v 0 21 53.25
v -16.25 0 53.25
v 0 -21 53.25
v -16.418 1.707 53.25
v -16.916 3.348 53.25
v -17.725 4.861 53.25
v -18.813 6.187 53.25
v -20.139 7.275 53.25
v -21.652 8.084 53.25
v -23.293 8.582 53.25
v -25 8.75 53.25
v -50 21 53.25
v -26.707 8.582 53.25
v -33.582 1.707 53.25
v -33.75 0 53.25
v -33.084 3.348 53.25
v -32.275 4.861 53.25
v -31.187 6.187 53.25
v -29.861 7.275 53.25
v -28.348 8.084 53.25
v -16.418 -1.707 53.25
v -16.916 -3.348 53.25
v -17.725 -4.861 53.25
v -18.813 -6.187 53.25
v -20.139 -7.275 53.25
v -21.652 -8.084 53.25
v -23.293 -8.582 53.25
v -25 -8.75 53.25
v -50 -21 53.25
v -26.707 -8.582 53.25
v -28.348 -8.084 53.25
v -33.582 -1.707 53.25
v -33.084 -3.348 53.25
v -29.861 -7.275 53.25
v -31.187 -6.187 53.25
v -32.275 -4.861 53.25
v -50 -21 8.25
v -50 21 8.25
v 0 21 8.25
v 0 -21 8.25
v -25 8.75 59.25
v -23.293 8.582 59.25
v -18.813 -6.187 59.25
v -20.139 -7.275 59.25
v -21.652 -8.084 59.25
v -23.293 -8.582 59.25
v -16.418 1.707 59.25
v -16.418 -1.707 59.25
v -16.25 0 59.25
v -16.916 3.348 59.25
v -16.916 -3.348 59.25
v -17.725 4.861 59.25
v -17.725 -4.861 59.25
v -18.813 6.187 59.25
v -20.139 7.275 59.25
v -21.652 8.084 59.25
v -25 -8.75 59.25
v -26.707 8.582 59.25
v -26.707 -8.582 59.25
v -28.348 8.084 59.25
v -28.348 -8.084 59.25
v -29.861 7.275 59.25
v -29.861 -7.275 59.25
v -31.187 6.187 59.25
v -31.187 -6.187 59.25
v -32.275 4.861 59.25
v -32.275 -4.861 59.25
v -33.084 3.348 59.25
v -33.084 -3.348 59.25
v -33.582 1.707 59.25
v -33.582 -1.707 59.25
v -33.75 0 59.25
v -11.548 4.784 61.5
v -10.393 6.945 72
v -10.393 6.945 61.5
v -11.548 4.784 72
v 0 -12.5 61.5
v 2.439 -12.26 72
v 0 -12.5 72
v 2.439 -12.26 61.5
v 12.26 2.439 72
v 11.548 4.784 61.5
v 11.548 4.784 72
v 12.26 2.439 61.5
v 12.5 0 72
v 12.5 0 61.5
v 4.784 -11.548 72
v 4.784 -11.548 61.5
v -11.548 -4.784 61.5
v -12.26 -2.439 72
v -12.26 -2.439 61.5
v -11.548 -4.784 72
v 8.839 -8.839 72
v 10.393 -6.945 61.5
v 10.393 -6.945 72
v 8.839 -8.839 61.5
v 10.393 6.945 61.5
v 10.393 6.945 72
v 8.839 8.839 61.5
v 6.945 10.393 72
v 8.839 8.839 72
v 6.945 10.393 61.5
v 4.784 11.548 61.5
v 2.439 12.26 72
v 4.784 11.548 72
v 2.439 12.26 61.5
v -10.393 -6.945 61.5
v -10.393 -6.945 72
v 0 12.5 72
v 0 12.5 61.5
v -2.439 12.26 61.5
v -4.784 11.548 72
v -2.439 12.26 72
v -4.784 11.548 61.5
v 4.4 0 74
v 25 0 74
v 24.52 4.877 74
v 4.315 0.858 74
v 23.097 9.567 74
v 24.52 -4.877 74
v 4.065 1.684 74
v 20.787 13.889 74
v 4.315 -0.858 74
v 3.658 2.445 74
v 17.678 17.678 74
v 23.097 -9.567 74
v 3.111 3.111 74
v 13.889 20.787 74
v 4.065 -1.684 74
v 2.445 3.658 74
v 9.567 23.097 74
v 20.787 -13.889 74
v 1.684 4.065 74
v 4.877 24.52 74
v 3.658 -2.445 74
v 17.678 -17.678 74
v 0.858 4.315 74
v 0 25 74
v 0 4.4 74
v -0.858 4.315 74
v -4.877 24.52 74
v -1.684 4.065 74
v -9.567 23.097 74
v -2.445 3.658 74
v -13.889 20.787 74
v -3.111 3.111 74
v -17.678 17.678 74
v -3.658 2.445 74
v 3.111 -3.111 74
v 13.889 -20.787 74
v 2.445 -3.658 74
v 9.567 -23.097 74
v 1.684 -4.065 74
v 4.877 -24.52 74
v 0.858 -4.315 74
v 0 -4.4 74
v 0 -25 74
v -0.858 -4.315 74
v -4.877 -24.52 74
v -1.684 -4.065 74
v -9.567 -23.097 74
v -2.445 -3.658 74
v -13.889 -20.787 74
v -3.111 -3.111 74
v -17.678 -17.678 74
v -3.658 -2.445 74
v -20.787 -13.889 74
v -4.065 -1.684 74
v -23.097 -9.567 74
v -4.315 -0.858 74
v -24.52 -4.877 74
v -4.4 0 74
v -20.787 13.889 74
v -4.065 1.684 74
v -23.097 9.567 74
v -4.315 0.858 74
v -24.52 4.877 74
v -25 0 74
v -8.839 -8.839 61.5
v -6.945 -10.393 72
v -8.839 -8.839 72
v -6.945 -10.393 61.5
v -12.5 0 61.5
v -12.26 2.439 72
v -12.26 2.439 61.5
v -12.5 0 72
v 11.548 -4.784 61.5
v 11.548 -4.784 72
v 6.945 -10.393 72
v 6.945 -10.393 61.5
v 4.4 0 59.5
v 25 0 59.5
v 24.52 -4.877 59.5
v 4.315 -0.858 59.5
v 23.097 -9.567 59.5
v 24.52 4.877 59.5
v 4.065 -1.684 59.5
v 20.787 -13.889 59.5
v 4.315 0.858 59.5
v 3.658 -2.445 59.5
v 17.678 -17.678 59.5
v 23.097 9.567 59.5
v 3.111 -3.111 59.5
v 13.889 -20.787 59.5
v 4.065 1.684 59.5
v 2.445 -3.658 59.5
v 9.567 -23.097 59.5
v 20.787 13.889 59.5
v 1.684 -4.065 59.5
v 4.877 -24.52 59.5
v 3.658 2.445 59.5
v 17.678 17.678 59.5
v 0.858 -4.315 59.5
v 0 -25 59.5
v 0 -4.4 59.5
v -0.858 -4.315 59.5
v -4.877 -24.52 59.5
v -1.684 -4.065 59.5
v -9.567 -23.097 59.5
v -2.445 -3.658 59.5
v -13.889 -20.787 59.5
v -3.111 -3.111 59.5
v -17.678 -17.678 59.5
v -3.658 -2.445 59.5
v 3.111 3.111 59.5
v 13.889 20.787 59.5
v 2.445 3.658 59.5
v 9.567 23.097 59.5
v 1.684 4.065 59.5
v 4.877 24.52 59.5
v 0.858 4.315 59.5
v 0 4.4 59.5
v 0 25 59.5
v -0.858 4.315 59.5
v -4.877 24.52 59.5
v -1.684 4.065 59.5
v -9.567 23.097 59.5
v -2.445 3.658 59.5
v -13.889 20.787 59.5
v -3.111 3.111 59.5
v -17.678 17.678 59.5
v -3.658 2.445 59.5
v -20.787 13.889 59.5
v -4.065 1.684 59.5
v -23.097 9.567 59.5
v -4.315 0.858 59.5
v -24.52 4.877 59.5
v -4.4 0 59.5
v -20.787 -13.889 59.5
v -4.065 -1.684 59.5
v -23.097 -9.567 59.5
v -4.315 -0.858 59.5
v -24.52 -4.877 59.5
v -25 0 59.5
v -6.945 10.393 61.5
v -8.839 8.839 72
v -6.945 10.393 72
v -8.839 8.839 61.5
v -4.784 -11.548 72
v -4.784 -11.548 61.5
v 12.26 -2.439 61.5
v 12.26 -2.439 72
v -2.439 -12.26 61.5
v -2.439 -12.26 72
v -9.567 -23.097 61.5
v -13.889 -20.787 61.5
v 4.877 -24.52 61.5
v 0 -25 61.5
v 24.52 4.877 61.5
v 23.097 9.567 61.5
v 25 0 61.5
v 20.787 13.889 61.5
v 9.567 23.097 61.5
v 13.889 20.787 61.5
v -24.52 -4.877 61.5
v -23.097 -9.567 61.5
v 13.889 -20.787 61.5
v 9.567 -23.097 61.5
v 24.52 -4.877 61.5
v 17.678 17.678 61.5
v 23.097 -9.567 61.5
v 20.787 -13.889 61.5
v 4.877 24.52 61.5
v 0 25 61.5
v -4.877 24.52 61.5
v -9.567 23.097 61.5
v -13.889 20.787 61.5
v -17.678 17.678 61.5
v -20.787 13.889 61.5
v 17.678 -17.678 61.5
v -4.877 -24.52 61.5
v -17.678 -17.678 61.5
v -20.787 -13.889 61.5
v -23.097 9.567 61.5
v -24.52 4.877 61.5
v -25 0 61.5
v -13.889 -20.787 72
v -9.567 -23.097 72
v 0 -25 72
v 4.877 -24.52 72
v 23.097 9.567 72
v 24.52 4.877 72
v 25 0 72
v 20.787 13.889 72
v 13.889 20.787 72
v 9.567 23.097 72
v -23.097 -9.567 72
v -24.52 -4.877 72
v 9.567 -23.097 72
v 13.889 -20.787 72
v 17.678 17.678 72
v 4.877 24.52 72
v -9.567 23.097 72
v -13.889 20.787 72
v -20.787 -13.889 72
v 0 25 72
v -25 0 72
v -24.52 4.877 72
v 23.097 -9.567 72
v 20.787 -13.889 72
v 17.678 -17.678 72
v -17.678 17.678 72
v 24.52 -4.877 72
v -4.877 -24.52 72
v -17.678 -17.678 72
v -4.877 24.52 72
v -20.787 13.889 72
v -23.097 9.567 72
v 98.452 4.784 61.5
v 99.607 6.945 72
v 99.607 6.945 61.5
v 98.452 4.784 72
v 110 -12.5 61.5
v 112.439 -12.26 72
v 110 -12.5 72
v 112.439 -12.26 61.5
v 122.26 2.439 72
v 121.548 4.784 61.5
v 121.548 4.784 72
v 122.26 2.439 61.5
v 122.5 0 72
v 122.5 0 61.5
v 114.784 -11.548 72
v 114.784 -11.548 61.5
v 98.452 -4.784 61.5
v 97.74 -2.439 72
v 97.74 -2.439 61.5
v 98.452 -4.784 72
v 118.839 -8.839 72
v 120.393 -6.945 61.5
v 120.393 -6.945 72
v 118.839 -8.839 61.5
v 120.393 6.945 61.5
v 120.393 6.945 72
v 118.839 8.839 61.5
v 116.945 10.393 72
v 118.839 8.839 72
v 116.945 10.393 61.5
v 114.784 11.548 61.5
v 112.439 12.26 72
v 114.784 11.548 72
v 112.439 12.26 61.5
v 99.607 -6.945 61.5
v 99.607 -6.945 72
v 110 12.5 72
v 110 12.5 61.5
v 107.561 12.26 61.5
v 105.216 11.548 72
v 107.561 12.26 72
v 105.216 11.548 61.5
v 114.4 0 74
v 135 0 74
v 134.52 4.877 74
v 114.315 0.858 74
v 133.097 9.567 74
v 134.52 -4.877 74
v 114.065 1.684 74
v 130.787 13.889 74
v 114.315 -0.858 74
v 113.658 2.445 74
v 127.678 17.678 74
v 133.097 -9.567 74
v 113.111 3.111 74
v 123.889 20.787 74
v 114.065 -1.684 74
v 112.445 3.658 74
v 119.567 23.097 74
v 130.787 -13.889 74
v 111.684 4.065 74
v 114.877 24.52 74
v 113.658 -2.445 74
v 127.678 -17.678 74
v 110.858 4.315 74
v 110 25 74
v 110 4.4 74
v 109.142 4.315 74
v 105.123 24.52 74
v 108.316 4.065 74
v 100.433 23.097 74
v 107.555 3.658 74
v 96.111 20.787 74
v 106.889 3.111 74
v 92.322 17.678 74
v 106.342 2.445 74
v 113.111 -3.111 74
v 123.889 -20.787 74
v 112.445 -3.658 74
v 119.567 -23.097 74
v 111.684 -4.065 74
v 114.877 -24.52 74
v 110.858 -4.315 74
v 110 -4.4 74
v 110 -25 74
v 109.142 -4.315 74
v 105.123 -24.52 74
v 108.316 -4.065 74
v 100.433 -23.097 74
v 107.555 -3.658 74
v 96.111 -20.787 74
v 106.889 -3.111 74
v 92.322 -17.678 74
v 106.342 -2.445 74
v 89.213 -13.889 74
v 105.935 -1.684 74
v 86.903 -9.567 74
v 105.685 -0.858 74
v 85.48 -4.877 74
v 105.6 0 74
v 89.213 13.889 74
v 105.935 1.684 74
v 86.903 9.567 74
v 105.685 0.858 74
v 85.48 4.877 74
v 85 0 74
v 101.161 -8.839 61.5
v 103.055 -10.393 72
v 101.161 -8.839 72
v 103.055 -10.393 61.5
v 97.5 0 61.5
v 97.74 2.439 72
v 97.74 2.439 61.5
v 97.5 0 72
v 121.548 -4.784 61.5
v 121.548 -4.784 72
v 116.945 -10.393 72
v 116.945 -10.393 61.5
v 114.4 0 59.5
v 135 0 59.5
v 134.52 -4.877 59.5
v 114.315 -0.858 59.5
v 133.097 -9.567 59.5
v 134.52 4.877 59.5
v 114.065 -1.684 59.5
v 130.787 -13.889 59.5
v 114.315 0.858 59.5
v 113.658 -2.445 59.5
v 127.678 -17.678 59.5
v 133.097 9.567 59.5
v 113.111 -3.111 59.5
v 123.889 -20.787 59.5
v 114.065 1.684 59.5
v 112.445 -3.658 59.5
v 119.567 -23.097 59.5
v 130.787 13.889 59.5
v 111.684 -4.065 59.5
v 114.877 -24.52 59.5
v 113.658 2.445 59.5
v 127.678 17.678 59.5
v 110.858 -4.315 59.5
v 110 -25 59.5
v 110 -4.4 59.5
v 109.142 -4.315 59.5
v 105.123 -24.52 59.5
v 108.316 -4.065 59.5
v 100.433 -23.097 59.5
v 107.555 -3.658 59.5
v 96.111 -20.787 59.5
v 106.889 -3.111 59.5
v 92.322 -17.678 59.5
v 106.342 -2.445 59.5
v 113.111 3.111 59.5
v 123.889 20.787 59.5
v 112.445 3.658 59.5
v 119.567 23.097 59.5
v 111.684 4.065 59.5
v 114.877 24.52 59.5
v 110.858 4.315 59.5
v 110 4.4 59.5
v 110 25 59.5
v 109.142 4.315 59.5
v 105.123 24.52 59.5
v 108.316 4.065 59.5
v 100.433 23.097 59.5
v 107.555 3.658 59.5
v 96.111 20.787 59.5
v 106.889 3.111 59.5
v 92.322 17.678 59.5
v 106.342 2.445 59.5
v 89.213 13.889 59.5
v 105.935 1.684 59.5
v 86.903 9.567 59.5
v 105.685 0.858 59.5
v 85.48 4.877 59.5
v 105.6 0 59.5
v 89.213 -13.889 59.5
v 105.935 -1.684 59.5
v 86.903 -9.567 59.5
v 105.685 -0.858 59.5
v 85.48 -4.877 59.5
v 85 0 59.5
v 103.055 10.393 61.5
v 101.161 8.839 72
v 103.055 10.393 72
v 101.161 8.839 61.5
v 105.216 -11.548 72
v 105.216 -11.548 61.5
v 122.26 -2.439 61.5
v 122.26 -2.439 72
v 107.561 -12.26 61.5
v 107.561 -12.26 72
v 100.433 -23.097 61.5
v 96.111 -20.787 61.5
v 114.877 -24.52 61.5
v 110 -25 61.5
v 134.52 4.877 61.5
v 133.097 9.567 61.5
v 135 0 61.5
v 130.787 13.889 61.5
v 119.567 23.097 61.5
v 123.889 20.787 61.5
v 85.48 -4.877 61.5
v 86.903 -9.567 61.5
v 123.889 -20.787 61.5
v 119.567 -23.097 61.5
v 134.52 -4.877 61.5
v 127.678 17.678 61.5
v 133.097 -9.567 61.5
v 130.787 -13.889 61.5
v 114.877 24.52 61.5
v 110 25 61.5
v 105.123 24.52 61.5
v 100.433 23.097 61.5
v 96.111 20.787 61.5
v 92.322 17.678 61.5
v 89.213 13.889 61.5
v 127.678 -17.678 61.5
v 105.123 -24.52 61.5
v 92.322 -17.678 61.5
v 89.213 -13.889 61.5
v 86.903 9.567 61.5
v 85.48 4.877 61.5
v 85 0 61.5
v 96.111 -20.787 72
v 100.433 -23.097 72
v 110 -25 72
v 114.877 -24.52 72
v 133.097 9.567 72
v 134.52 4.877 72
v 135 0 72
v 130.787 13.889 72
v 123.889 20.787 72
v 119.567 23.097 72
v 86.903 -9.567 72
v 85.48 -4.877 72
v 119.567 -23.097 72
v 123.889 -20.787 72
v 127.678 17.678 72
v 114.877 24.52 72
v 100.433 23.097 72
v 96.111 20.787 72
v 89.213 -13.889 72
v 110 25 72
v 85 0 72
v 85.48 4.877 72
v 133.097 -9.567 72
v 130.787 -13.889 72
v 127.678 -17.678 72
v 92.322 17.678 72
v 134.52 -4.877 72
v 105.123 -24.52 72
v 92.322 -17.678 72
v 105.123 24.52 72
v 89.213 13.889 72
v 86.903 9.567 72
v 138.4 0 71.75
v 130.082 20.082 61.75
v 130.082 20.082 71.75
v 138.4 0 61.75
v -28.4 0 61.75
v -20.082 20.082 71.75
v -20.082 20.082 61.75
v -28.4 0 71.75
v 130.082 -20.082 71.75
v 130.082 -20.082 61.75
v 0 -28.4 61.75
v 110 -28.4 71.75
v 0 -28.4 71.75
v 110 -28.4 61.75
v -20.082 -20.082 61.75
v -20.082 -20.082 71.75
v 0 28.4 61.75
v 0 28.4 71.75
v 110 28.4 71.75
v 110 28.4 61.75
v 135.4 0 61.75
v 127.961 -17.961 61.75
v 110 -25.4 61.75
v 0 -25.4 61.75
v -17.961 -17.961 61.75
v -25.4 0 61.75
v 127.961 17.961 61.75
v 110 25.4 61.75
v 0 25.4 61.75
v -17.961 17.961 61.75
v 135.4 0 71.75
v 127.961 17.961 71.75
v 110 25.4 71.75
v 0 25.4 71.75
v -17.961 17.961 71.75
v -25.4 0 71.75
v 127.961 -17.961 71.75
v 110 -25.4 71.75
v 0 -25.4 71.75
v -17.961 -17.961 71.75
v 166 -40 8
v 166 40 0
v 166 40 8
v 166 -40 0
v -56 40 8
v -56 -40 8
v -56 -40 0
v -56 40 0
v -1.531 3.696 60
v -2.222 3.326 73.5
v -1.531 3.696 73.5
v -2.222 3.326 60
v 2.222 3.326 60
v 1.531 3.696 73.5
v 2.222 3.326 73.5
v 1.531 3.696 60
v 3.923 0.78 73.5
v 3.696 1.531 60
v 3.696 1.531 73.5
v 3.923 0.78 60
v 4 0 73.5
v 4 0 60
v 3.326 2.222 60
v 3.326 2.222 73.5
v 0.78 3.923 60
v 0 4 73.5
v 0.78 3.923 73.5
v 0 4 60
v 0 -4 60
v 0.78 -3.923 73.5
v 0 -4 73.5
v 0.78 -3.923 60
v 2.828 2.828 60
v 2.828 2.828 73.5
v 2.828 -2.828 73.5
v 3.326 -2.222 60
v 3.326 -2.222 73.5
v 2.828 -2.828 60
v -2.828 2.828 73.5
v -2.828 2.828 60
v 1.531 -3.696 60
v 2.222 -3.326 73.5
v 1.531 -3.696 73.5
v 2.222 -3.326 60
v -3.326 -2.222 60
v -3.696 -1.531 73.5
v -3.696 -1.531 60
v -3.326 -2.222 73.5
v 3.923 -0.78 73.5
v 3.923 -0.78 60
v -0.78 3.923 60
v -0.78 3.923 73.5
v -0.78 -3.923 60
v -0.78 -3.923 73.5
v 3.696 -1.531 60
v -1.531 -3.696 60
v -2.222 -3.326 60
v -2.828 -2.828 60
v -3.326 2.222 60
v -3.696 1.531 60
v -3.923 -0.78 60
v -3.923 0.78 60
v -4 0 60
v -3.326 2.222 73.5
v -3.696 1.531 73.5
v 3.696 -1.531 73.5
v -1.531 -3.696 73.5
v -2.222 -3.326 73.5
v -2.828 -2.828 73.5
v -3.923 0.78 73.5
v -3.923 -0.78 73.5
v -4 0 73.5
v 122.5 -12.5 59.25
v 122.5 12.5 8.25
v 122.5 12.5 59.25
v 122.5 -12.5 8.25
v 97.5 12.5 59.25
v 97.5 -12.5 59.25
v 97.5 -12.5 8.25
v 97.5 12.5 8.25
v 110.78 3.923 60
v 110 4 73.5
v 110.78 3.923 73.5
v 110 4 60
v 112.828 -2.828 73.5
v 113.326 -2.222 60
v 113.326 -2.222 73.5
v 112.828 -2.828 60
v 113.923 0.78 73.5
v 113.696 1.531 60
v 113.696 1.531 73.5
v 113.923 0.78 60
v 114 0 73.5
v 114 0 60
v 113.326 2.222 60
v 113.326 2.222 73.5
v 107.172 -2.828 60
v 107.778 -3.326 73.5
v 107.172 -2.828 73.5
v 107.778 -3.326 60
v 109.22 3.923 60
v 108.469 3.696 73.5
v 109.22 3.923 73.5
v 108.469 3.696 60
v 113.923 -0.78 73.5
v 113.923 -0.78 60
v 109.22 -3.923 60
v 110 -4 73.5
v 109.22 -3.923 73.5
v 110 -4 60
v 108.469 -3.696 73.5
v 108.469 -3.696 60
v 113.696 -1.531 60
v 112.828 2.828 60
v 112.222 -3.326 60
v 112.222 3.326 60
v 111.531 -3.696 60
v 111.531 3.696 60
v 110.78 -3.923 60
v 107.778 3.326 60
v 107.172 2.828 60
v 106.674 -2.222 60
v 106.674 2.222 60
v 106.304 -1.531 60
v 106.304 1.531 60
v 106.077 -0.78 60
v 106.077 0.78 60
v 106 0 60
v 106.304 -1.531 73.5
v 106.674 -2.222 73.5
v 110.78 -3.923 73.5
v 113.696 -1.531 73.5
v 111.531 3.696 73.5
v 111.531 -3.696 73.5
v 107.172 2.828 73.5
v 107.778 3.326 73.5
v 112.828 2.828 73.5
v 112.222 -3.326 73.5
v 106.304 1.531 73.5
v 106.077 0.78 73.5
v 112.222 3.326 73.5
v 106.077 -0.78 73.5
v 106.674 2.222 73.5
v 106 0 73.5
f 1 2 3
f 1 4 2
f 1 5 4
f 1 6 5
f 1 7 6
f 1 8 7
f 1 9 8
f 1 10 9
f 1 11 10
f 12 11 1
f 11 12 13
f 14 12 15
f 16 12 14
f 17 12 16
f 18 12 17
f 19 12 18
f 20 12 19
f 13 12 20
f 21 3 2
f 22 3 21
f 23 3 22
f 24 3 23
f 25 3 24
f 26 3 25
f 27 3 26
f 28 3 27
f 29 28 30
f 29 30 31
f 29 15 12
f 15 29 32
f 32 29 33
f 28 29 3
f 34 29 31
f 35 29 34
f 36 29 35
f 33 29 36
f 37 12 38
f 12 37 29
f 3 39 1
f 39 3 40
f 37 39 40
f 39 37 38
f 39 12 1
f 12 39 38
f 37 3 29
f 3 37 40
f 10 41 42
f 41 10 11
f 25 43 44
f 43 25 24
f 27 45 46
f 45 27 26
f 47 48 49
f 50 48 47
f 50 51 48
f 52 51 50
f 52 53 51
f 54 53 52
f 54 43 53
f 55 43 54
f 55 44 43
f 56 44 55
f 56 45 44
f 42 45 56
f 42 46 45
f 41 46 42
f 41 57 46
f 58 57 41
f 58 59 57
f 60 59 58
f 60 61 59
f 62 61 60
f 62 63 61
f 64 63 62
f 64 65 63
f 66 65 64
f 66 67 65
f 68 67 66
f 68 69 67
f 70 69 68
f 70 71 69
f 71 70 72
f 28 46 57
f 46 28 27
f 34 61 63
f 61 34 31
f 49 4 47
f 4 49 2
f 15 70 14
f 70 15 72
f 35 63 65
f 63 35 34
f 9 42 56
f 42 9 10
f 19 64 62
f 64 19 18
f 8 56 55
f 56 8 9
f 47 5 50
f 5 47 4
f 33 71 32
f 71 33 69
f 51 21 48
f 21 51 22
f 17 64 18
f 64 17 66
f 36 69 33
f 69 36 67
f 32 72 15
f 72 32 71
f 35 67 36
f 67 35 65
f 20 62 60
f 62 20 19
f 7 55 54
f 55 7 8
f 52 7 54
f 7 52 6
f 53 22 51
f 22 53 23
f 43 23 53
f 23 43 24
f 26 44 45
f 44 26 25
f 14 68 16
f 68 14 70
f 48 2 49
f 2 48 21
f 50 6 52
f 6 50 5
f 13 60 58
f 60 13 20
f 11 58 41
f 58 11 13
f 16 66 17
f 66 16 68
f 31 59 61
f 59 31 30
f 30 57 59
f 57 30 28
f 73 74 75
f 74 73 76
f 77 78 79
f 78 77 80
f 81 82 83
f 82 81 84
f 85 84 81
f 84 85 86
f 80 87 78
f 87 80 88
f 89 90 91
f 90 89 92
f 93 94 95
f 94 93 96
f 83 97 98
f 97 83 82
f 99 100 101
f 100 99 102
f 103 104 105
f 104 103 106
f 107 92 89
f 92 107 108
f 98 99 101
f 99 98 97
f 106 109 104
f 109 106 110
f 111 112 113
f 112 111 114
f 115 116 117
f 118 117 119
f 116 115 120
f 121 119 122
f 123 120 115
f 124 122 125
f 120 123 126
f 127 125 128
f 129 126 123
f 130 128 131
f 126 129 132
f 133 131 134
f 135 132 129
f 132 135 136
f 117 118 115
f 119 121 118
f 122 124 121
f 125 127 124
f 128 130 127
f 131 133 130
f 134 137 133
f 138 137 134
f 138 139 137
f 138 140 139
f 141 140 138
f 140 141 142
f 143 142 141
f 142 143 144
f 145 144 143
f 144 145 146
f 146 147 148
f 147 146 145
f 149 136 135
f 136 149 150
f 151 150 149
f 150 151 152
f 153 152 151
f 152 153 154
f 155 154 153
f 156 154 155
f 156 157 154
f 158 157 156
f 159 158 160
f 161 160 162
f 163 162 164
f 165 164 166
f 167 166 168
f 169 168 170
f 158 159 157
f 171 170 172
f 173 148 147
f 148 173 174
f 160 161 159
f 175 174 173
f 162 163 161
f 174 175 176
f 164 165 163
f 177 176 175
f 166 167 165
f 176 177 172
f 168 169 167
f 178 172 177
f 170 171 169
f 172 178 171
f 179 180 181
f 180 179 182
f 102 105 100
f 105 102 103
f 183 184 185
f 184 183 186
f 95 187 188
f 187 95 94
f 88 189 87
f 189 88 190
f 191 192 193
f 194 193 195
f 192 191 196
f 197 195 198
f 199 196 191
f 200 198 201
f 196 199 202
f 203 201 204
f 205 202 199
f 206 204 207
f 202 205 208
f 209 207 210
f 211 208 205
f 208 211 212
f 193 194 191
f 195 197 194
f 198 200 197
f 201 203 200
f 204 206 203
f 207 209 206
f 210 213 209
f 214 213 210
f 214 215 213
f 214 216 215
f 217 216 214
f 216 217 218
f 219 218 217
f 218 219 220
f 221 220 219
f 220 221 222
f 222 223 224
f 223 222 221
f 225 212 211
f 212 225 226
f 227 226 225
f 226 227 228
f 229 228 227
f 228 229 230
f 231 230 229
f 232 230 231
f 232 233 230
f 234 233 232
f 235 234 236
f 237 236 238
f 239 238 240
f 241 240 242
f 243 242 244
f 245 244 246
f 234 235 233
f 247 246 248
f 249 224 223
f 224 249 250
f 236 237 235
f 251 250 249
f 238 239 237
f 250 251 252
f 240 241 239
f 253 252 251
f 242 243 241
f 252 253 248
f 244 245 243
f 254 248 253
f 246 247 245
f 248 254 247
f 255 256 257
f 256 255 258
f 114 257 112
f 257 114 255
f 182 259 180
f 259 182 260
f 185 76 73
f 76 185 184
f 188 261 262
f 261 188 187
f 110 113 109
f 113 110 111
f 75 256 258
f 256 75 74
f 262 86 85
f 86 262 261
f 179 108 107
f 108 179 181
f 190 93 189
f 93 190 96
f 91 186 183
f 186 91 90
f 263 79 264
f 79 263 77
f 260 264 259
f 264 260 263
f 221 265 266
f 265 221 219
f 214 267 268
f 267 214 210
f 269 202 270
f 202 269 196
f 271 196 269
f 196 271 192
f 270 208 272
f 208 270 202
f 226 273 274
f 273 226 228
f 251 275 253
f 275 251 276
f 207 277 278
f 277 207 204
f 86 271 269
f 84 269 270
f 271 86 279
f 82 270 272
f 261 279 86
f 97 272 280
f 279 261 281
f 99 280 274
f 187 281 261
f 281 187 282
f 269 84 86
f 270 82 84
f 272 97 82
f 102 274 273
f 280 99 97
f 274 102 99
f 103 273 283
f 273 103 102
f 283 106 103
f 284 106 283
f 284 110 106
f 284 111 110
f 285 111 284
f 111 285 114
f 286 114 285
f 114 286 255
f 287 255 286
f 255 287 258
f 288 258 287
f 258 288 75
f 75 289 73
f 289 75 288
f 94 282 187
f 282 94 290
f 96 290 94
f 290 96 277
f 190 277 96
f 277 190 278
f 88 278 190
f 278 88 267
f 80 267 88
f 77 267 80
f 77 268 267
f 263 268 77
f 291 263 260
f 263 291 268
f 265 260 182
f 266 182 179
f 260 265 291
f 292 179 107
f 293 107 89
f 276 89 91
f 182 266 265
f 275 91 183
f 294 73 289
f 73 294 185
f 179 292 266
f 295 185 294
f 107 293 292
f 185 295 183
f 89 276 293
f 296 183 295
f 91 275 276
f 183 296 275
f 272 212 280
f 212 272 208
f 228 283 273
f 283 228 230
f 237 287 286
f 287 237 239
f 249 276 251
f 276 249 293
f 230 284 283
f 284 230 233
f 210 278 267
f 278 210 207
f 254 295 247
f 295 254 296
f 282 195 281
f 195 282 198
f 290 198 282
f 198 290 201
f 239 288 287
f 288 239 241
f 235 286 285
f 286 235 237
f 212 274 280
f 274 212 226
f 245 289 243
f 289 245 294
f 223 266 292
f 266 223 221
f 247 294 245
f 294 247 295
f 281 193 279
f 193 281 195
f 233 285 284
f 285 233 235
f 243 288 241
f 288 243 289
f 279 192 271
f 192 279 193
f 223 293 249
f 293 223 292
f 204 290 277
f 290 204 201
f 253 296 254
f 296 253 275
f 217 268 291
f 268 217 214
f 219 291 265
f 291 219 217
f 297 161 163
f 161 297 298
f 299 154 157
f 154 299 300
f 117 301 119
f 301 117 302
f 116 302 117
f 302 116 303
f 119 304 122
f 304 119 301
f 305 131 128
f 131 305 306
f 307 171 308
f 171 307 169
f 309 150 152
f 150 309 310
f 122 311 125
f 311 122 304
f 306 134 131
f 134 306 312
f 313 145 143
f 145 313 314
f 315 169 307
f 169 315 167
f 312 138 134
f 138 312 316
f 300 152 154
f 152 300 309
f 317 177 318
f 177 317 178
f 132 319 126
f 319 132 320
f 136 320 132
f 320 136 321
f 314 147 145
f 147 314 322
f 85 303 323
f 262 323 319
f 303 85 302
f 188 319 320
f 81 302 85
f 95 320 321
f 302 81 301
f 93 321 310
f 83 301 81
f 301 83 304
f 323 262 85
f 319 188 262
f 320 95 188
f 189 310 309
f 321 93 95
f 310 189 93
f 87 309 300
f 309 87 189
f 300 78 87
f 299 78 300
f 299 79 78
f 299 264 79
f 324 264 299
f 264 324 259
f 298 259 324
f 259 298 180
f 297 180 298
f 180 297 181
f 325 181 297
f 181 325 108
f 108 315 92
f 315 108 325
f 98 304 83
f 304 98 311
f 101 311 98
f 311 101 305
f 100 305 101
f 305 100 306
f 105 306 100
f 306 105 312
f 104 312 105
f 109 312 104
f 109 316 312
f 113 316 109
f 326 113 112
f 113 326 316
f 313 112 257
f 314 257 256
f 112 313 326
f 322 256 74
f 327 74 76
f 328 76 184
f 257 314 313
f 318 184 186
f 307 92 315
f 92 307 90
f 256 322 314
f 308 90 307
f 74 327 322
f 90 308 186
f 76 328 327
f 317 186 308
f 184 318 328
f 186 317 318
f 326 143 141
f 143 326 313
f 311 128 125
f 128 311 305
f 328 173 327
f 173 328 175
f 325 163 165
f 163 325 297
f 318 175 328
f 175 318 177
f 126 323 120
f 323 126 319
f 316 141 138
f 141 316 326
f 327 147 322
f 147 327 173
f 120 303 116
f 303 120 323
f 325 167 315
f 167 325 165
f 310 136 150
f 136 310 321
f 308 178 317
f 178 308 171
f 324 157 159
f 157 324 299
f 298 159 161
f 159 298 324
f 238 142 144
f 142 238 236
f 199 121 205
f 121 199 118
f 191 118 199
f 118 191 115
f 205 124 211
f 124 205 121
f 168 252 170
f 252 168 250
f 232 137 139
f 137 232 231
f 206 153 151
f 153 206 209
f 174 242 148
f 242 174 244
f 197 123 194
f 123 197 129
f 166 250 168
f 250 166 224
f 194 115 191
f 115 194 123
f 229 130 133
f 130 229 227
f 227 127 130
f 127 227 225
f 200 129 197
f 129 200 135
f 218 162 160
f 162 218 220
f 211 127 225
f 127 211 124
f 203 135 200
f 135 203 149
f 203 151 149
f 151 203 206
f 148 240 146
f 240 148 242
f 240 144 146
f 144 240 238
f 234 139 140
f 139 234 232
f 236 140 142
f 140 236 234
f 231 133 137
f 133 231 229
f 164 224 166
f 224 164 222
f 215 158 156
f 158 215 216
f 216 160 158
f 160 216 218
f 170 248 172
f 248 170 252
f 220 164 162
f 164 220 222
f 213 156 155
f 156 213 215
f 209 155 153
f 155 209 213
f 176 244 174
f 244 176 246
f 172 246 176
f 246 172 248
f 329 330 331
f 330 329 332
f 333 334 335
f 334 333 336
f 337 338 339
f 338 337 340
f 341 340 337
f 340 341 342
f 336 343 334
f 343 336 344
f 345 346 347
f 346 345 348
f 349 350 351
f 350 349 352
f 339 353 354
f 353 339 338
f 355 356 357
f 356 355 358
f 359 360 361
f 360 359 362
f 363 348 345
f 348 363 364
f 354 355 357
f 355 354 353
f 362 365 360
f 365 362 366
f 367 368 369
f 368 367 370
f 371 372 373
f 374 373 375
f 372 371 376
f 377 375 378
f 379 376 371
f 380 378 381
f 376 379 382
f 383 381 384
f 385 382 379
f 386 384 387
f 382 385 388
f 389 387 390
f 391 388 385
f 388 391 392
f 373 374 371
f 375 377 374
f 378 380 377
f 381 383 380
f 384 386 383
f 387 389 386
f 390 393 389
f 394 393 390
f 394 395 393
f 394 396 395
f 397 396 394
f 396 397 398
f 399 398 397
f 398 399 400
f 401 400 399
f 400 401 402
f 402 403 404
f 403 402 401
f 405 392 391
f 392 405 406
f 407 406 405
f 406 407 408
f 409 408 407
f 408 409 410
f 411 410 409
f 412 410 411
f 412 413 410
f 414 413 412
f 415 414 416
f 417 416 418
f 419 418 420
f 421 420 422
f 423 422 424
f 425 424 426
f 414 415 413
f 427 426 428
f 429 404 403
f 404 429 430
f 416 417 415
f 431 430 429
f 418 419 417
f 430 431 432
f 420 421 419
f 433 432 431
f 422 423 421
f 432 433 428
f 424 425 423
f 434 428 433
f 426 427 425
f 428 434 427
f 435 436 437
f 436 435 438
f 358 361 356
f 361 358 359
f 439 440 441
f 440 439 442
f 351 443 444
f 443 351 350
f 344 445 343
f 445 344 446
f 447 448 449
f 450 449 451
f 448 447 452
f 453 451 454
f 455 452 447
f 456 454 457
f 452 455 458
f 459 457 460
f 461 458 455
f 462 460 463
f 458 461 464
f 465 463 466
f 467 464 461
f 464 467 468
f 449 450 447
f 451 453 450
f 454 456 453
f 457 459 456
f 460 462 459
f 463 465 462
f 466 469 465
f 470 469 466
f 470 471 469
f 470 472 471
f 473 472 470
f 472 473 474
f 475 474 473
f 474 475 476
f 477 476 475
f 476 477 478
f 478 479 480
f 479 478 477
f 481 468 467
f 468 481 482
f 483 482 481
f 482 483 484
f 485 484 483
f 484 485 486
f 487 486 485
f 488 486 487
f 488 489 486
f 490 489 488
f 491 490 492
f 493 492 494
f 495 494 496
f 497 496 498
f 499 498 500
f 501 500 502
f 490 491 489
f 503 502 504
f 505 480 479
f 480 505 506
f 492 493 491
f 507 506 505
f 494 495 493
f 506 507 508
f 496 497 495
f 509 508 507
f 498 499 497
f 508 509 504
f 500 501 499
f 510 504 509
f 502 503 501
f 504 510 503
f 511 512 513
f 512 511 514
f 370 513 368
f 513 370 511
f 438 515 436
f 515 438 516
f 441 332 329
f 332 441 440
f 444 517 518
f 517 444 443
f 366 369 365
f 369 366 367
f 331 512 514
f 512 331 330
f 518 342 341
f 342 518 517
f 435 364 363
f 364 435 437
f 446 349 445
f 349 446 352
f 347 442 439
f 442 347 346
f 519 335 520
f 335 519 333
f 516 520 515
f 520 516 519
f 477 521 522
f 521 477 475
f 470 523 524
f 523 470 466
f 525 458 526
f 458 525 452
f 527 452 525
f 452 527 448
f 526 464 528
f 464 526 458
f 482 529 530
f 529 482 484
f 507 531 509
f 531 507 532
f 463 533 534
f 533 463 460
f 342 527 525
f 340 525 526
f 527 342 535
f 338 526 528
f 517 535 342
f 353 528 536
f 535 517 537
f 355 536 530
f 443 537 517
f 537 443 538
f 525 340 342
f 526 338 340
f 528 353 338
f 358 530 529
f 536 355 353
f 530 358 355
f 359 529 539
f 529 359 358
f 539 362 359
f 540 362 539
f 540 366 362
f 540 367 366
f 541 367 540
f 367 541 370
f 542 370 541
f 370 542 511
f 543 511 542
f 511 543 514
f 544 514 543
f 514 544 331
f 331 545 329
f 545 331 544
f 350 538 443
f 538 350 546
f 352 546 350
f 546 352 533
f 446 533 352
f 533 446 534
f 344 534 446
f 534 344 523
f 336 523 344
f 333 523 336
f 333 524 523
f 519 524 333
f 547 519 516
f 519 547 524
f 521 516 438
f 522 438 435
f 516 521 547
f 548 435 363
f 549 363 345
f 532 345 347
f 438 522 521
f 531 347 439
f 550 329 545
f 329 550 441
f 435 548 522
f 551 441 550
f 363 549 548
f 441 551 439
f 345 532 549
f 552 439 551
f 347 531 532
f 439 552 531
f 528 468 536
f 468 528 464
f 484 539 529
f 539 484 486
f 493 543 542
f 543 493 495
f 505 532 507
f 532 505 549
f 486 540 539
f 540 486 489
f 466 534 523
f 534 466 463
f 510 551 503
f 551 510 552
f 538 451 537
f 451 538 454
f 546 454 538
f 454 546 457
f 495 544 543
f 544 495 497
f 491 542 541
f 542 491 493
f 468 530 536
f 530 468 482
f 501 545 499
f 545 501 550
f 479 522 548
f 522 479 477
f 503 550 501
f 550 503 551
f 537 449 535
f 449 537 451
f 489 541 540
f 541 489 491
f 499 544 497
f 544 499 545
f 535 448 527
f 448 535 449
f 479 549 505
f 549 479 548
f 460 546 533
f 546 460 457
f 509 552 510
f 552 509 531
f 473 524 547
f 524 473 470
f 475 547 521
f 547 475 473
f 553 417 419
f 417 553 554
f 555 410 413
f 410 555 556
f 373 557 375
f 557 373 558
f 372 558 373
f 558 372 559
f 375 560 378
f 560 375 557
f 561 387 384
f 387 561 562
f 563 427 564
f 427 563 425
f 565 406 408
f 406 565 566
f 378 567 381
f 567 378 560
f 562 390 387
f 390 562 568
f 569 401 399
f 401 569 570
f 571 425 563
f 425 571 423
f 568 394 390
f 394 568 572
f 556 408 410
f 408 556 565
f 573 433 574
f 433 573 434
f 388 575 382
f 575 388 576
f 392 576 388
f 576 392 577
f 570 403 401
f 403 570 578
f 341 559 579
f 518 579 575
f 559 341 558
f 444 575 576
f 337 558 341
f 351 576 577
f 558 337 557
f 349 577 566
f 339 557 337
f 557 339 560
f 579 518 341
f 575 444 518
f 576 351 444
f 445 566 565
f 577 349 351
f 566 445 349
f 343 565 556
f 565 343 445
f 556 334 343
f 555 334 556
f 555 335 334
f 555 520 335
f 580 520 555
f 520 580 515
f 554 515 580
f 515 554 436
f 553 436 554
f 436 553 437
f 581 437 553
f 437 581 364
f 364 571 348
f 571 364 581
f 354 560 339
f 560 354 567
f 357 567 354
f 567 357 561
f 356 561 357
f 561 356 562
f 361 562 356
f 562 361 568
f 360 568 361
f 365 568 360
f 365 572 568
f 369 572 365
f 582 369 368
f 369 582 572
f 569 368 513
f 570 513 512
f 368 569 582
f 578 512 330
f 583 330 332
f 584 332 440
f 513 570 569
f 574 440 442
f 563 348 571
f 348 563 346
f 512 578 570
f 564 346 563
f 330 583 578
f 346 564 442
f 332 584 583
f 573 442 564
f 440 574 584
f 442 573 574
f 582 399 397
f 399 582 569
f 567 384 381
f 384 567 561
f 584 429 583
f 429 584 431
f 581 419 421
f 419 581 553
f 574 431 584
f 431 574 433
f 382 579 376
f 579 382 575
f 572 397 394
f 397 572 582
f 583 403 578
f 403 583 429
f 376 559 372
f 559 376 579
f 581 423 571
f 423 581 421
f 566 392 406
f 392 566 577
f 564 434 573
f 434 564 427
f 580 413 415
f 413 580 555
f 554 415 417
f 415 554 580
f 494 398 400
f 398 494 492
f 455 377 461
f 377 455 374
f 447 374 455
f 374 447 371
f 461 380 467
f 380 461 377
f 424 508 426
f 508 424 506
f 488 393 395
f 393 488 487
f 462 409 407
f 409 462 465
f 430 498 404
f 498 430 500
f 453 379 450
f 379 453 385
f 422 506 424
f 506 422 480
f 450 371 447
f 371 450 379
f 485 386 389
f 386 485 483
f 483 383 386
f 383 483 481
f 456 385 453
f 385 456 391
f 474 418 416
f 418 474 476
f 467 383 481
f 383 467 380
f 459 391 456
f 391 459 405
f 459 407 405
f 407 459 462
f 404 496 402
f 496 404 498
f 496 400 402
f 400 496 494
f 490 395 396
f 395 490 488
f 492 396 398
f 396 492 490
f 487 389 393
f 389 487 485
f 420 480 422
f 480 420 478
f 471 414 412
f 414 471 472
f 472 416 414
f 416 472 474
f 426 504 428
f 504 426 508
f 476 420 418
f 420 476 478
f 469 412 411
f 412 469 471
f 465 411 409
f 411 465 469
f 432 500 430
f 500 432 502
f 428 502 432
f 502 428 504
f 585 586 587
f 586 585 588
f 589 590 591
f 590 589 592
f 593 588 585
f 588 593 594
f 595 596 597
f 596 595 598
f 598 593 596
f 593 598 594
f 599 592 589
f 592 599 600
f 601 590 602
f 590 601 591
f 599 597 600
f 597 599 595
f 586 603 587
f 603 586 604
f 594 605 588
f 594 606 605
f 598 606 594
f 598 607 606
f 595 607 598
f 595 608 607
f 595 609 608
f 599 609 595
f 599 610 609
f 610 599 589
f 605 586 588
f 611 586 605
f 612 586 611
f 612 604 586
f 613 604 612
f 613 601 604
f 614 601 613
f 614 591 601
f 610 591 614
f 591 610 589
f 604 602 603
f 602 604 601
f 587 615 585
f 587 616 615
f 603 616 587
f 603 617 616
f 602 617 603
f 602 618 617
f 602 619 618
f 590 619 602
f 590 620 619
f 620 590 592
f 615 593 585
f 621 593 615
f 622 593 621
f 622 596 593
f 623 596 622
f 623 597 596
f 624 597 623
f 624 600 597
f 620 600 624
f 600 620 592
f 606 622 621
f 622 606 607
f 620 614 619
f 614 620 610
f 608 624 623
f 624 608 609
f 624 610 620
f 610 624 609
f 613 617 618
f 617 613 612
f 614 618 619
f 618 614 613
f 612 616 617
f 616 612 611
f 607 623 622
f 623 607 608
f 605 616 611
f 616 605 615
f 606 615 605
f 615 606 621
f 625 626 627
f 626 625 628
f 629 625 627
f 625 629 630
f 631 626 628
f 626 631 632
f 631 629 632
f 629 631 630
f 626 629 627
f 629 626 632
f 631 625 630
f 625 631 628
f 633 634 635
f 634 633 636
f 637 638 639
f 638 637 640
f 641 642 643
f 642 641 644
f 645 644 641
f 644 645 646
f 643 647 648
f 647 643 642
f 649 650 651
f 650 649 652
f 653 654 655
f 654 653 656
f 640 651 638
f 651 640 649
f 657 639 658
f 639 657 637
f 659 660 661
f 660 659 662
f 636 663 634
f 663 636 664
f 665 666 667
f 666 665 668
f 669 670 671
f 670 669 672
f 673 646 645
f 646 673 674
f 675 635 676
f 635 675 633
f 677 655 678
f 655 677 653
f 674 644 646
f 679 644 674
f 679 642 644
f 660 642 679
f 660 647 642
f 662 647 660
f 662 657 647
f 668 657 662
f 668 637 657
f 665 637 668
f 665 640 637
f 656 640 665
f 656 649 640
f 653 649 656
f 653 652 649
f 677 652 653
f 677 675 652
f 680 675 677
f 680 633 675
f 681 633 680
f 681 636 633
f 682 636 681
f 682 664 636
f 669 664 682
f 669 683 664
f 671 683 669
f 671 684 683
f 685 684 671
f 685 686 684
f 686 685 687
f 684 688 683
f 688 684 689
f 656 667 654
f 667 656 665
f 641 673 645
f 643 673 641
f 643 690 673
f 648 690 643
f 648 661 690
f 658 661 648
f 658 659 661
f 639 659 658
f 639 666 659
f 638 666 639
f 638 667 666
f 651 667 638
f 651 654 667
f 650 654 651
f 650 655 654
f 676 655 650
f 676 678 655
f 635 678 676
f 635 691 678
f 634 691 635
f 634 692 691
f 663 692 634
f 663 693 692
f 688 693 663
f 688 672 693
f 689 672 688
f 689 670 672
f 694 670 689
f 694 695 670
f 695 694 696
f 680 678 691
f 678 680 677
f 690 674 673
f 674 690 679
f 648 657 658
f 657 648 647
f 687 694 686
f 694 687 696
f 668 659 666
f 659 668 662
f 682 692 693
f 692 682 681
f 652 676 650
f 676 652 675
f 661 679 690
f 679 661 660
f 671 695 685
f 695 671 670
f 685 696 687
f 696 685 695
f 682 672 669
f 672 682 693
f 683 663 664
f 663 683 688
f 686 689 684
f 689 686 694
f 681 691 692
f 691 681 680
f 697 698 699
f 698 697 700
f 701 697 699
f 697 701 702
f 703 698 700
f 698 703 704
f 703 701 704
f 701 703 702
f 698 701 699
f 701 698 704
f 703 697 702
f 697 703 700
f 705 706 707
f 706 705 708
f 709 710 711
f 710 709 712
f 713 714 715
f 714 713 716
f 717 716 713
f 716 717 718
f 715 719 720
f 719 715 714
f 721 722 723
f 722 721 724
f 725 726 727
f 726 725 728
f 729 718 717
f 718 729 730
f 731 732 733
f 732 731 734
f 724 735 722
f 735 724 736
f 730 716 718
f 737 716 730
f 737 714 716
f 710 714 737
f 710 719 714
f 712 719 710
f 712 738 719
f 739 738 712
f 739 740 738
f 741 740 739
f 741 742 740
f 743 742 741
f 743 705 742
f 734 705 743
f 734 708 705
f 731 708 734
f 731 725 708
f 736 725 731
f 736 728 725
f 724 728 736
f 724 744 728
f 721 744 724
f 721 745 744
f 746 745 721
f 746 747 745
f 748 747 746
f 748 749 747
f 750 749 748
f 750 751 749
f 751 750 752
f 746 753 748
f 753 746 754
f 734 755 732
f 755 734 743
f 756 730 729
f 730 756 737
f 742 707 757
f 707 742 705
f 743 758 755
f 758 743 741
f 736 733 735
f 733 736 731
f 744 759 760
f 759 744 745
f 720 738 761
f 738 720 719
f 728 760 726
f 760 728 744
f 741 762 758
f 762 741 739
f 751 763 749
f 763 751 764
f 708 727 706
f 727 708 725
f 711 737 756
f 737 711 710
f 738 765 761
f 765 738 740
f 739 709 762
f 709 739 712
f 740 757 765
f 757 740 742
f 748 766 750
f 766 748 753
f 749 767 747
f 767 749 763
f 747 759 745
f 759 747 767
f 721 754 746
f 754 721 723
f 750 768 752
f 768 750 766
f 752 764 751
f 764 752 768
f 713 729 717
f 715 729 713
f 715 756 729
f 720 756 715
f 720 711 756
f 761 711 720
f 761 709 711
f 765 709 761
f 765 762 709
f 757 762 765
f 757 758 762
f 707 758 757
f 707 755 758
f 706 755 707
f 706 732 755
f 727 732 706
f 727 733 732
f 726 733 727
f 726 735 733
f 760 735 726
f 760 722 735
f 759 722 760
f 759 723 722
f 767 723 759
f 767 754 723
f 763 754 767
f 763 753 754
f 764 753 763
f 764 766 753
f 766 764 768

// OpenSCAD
$fn = 32;

// ------------------------------------------------------------------------
// Motor belt drive: span 110 mm, pulleys d50, belt 10 mm wide
// Every part is its own module, assembly() places every instance.
// ------------------------------------------------------------------------

// --- part 1 ---
module base_plate() {
  difference() {
    translate([-111, -40, 0]) cube([222, 80, 8]);
  }
}

// --- part 2 ---
module motor() {
  union() {
    translate([-22.5, -21, 0]) cube([45, 42, 50]);
    translate([25.5, 0, 25]) rotate([0, 90, 0]) cylinder(h = 6, d = 17.5, center = true);
  }
}

// --- part 3 ---
module drive_shaft() {
  translate([0, 0, -6.75]) cylinder(h = 13.5, d = 8);
}

// --- part 4 ---
module pulley_drive() {
  difference() {
    union() {
      cylinder(h = 14.5, d = 25);
      cylinder(h = 2, d = 50);
      translate([0, 0, 12.5]) cylinder(h = 2, d = 50);
    }
    translate([0, 0, -1]) cylinder(h = 16.5, d = 8.8);
  }
}

// --- part 5 ---
module idler_post() {
  translate([-12.5, -12.5, 0]) cube([25, 25, 51]);
}

// --- part 6 ---
module driven_shaft() {
  translate([0, 0, -6.75]) cylinder(h = 13.5, d = 8);
}

// --- part 7 ---
module pulley_driven() {
  difference() {
    union() {
      cylinder(h = 14.5, d = 25);
      cylinder(h = 2, d = 50);
      translate([0, 0, 12.5]) cylinder(h = 2, d = 50);
    }
    translate([0, 0, -1]) cylinder(h = 16.5, d = 8.8);
  }
}

// --- part 8 ---
module drive_belt() {
  difference() {
    linear_extrude(height = 10) polygon(points = concat([for (a = [90 : 45 : 270]) [28.4 * cos(a), 28.4 * sin(a)]], [for (a = [270 : 45 : 450]) [110 + 28.4 * cos(a), 28.4 * sin(a)]]));
    translate([0, 0, -1]) linear_extrude(height = 12) polygon(points = concat([for (a = [90 : 45 : 270]) [25.4 * cos(a), 25.4 * sin(a)]], [for (a = [270 : 45 : 450]) [110 + 25.4 * cos(a), 25.4 * sin(a)]]));
  }
}

// --- assembly ---
module assembly() {
  color([0.80, 0.24, 0.20]) translate([55, 0, 0]) rotate([0, 0, 0]) base_plate();
  color([0.20, 0.45, 0.75]) translate([0, 0, 30.75]) rotate([0, 270, 0]) motor();
  color([0.25, 0.62, 0.32]) translate([0, 0, 66.75]) rotate([0, 0, 0]) drive_shaft();
  color([0.92, 0.70, 0.18]) translate([0, 0, 59.5]) rotate([0, 0, 0]) pulley_drive();
  color([0.58, 0.35, 0.70]) translate([110, 0, 8.25]) rotate([0, 0, 0]) idler_post();
  color([0.16, 0.66, 0.66]) translate([110, 0, 66.75]) rotate([0, 0, 0]) driven_shaft();
  color([0.85, 0.48, 0.18]) translate([110, 0, 59.5]) rotate([0, 0, 0]) pulley_driven();
  color([0.55, 0.60, 0.65]) translate([0, 0, 61.75]) rotate([0, 0, 0]) drive_belt();
}

assembly();
